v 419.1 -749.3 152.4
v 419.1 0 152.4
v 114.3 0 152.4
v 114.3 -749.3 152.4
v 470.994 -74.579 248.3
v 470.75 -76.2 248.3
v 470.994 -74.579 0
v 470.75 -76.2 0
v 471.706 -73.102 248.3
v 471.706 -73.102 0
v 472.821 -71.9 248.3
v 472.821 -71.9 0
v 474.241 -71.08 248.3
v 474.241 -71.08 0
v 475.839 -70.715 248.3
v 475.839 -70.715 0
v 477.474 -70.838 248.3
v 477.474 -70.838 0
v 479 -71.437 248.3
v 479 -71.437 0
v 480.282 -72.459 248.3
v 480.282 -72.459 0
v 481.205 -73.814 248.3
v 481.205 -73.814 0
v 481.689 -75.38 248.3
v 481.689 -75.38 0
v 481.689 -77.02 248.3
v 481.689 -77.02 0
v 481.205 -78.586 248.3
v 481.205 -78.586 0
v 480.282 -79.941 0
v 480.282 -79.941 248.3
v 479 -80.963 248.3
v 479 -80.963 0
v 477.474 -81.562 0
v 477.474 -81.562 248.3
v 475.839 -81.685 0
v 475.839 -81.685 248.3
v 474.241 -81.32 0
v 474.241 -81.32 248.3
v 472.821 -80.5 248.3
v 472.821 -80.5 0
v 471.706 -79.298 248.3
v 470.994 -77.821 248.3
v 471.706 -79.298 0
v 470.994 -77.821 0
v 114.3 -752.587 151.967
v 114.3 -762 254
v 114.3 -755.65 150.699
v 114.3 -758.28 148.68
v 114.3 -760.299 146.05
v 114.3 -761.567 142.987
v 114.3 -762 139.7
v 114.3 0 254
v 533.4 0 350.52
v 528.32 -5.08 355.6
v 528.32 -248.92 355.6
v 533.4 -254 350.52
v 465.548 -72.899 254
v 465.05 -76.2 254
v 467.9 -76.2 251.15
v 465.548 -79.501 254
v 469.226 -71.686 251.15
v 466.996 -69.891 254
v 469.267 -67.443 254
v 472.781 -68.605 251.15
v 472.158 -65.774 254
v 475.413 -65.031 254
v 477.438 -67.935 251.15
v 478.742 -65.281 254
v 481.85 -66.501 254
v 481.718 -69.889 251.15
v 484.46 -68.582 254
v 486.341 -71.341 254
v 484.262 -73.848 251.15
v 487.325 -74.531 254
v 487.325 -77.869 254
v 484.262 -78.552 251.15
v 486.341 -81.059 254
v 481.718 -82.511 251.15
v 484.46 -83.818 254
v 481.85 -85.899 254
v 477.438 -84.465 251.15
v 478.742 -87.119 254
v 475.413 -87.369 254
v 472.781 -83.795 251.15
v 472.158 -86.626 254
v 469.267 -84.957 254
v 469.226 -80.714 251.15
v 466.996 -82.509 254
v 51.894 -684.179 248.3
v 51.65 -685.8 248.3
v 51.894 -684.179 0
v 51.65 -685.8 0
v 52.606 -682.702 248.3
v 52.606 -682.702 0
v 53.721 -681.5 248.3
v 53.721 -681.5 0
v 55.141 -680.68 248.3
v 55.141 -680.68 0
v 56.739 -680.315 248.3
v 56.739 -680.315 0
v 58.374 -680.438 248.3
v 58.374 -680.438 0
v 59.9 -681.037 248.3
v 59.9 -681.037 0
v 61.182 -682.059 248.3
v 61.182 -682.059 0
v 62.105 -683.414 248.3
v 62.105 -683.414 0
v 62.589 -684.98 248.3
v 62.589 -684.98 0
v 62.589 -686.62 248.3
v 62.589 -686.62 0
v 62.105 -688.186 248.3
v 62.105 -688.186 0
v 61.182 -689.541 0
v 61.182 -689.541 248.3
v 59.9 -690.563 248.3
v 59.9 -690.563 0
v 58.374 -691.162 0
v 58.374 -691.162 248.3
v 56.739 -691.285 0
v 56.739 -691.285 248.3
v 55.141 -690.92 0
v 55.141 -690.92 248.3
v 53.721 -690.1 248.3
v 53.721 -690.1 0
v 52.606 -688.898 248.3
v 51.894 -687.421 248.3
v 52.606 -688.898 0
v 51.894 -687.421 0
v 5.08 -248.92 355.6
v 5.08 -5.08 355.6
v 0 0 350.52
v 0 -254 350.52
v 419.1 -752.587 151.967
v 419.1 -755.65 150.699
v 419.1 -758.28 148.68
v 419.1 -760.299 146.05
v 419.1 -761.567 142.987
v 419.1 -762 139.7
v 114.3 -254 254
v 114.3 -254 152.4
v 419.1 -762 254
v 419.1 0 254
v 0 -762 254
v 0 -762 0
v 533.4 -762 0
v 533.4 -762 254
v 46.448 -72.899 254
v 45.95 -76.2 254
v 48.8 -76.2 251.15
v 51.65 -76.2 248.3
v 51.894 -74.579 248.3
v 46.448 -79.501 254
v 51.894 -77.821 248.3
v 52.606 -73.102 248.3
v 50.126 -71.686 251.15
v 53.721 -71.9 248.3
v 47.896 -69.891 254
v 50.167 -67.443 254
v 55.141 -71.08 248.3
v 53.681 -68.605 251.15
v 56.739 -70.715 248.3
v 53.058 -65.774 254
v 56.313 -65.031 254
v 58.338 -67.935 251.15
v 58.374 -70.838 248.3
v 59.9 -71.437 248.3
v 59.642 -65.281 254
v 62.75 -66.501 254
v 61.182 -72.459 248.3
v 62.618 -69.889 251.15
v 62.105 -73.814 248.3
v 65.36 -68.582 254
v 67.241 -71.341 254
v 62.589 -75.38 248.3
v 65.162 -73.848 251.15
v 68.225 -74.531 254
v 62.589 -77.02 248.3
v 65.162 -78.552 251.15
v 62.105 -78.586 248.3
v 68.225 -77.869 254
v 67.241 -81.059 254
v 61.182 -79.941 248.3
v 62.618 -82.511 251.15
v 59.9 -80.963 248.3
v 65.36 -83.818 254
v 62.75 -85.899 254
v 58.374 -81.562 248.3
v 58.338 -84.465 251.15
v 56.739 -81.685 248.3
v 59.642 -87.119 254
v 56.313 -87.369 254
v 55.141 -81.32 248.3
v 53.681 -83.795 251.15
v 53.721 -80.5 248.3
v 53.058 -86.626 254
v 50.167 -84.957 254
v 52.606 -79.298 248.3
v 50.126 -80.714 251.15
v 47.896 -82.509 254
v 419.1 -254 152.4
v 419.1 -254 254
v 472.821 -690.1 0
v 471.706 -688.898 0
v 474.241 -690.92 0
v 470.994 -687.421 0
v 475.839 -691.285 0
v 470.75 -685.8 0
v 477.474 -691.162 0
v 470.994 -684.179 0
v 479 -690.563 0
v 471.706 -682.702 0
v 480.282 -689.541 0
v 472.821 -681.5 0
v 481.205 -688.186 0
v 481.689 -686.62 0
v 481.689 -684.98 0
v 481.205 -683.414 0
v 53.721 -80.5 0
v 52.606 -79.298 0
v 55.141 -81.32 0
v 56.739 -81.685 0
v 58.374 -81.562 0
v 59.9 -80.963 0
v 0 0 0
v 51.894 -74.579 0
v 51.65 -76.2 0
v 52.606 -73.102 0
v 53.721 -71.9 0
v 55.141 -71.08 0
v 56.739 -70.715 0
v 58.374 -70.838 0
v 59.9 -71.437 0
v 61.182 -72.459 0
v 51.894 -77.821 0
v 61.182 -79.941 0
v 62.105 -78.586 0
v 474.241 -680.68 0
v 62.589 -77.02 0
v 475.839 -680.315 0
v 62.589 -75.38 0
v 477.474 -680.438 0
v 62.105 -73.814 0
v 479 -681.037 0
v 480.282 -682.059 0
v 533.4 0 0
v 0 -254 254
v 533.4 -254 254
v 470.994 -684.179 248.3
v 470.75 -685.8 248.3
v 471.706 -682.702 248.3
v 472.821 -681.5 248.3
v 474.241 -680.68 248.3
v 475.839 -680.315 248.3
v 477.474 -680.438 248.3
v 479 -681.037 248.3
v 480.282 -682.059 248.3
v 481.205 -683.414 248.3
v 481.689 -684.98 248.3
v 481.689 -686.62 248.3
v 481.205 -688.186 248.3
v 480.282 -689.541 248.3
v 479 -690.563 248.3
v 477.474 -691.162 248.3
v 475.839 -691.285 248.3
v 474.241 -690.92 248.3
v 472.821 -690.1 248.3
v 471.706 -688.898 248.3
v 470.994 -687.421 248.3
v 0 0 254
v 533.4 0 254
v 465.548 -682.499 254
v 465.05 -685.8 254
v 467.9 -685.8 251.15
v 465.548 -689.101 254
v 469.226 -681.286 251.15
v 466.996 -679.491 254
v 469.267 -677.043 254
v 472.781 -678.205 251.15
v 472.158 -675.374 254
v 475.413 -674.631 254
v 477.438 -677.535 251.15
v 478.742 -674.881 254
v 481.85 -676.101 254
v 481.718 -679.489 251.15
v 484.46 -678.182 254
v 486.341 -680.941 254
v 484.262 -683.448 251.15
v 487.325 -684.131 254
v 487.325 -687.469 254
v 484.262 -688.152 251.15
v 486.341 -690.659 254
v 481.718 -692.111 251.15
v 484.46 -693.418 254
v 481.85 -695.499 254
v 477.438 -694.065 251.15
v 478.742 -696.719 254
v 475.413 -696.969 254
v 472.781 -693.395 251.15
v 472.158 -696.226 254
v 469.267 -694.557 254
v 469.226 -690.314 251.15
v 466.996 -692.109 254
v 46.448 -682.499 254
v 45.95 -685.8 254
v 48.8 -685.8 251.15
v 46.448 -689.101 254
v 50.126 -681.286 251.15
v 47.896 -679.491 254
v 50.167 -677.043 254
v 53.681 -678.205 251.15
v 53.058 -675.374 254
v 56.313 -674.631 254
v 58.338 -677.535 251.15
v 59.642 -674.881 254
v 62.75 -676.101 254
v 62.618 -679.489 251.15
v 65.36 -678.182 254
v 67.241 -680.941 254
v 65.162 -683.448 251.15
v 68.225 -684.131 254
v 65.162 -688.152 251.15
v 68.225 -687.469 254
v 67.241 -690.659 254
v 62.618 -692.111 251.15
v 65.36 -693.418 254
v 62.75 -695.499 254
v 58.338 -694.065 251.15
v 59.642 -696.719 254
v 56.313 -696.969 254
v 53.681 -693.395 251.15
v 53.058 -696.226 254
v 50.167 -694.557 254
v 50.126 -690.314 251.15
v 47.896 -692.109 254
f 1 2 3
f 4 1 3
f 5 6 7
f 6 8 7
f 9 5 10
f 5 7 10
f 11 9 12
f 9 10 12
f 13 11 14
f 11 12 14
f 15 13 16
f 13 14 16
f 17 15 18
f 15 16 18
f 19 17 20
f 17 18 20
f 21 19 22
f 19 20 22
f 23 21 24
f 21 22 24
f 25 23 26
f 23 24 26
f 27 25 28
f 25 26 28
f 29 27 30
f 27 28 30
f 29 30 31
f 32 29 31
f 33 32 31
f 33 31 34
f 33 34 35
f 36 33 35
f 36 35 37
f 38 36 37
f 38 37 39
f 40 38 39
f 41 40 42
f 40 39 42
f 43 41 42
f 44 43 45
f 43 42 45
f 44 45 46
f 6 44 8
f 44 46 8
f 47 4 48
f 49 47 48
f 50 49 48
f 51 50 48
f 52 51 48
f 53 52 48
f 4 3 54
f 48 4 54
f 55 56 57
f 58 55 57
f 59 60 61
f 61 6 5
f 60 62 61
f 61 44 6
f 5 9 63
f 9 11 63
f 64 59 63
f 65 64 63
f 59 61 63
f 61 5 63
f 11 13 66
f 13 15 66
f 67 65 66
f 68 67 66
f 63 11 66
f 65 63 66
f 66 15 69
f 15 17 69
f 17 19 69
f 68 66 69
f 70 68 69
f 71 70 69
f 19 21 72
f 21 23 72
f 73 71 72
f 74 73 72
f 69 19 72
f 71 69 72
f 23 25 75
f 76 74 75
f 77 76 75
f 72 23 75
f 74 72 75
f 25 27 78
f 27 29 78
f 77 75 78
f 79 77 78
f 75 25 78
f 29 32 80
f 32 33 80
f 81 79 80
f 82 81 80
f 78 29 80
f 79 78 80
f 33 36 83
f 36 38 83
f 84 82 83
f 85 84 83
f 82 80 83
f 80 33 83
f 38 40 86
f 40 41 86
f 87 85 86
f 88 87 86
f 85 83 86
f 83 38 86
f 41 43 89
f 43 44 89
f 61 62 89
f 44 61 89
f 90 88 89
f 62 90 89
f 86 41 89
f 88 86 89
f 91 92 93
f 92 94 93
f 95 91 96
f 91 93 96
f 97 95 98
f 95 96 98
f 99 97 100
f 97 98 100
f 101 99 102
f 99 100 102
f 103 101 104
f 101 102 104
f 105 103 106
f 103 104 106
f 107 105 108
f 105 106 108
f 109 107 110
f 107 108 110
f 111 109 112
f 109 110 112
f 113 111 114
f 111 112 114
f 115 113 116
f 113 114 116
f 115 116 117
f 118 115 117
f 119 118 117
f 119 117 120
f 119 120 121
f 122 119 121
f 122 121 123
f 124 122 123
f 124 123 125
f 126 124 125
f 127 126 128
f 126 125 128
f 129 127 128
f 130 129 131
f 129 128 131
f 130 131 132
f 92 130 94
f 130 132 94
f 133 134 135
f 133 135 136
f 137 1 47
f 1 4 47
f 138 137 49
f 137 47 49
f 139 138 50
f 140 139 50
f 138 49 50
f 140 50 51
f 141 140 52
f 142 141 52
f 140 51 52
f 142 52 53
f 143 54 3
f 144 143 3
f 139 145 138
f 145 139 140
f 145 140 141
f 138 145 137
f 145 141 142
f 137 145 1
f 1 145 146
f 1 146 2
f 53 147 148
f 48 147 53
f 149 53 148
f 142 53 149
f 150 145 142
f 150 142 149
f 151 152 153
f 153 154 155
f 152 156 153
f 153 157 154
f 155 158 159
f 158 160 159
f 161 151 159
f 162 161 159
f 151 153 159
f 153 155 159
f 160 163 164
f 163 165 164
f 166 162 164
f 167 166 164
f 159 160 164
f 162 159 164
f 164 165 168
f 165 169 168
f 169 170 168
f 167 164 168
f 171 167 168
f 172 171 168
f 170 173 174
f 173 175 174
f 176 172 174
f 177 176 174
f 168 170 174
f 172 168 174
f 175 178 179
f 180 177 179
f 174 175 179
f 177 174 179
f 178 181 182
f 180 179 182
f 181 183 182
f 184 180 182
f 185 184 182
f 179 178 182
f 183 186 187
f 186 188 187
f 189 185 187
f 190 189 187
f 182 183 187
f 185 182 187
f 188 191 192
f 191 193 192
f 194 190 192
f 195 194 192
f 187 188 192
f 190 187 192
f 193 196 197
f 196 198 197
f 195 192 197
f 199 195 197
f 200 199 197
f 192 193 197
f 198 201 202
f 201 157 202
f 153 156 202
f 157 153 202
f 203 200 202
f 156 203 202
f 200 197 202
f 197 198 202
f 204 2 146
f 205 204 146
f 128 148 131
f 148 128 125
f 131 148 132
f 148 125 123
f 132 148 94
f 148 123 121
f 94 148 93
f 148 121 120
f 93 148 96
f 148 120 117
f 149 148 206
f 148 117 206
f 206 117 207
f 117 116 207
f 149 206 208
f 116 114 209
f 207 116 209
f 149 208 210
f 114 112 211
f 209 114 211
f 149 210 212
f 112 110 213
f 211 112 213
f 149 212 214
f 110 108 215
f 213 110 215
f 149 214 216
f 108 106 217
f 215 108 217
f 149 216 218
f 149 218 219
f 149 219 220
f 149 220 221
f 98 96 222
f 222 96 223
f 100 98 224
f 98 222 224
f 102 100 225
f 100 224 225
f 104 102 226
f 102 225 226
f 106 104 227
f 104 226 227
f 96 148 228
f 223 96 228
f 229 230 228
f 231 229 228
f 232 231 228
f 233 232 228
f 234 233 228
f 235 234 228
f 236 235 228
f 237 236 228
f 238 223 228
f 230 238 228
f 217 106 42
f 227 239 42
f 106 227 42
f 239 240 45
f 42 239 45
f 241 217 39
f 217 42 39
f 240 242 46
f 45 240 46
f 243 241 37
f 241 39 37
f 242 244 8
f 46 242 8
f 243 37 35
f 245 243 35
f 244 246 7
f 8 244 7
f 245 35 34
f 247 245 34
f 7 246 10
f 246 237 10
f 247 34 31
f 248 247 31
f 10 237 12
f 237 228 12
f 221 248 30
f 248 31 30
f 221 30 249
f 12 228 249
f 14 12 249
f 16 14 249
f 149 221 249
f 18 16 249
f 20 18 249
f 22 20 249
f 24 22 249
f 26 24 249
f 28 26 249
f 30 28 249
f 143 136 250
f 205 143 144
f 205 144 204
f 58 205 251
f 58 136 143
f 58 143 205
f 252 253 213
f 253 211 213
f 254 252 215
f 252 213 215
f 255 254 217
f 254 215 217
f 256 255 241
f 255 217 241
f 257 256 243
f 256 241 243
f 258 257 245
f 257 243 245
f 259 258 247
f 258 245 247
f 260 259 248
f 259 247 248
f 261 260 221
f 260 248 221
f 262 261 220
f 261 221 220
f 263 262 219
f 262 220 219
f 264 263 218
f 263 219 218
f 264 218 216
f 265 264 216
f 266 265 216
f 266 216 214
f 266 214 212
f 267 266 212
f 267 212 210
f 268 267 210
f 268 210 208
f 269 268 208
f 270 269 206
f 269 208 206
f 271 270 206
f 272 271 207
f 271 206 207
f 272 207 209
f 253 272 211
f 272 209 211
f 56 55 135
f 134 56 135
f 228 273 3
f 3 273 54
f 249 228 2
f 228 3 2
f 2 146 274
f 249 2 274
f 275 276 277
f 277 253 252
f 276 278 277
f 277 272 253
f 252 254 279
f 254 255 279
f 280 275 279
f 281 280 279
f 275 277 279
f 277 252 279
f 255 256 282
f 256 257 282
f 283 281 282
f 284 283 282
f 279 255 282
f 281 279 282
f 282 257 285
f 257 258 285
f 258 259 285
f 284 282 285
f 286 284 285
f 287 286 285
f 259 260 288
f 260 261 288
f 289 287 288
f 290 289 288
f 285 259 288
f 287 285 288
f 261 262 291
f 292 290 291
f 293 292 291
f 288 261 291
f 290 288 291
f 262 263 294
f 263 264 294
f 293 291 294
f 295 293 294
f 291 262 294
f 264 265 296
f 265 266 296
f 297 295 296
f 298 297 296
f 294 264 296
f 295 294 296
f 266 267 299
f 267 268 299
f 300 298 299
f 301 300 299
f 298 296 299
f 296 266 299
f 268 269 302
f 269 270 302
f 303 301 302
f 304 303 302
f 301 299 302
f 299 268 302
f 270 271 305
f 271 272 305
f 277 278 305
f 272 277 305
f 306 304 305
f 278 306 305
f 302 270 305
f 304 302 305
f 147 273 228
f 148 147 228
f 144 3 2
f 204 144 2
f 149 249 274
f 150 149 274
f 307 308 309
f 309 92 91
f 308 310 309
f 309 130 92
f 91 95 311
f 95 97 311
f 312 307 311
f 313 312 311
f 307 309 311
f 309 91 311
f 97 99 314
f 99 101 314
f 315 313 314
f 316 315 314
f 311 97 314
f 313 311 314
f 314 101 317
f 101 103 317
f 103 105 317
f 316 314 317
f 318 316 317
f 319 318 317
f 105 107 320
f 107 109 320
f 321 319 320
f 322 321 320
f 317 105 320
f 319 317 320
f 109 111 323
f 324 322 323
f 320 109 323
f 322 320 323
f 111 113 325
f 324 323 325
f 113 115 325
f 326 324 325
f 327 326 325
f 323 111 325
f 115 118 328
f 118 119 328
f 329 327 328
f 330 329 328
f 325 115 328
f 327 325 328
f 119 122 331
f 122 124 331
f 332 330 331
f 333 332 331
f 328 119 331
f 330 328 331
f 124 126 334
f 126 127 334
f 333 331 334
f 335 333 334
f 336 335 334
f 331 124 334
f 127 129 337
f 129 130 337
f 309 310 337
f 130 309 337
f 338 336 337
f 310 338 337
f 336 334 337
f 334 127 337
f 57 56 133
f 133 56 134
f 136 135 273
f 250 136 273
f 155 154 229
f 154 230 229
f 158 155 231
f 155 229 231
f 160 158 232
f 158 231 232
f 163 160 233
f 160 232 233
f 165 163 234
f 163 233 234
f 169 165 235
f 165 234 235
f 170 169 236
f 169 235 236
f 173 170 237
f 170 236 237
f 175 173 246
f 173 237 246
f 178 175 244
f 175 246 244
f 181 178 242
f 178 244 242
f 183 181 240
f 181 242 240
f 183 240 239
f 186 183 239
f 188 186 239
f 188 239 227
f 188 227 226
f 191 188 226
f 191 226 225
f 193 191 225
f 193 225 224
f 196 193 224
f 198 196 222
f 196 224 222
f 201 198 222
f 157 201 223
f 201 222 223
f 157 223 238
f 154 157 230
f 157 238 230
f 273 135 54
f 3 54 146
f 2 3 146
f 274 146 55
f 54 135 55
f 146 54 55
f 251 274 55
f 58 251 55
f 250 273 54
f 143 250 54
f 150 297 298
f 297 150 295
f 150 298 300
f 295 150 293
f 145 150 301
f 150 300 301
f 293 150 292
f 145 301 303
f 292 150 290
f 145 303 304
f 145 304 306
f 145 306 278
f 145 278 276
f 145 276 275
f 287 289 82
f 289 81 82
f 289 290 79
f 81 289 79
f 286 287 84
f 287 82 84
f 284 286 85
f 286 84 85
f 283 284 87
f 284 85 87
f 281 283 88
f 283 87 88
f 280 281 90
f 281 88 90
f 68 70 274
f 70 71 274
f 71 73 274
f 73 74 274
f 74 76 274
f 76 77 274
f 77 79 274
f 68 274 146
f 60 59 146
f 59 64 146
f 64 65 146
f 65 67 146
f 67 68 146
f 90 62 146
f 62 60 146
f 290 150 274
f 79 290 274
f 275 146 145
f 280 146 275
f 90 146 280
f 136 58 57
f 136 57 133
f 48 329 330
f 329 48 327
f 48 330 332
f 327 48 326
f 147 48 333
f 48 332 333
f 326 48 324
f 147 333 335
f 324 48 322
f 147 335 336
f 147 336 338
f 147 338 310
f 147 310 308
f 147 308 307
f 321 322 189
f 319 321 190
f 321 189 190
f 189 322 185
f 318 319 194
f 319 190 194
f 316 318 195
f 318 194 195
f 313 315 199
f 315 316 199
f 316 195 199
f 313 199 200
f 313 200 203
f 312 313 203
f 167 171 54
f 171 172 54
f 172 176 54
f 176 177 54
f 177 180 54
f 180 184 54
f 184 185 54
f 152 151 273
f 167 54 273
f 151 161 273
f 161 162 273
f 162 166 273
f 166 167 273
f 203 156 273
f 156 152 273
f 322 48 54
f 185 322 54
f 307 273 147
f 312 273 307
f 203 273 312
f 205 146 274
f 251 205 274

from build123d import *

# Parameters (mm, degrees)
F1_DEPTH       = 762
F3_D           = 11
F3_CSINK_D     = 22.4
F3_CSINK_ANGLE = 90
F5_DEPTH       = 254
F6_R           = 12.7
F7_SIZE        = 5.08


with BuildPart() as f1:
    # F0 (on Front) → F1 (new body)
    with BuildSketch(Plane.XZ):
        Polygon((114.3, 254), (0, 254), (0, 0), (533.4, 0), (533.4, 254), (419.1, 254), (419.1, 152.4), (114.3, 152.4), align=None)
    extrude(amount=F1_DEPTH)

    # F3 (through all)
    with Locations(Plane.XY.offset(254)):
        with Locations((57.15, -76.2), (476.25, -76.2), (476.25, -685.8), (57.15, -685.8)):
            CounterSinkHole(F3_D / 2, F3_CSINK_D / 2, counter_sink_angle=F3_CSINK_ANGLE)

    # F6
    f6_edges = [f1.edges().sort_by_distance(p)[0] for p in [
        (266.7, -762, 152.4),
    ]]
    fillet(f6_edges, radius=F6_R)


with BuildPart() as f5:
    # F4 (on Front) → F5 (new body)
    with BuildSketch(Plane.XZ):
        Polygon((0, 355.6), (0, 254), (114.3, 254), (114.3, 152.4), (419.1, 152.4), (419.1, 254), (533.4, 254), (533.4, 355.6), align=None)
    extrude(amount=F5_DEPTH)

    # F7
    f7_edges = [f5.edges().sort_by_distance(p)[0] for p in [
        (533.4, -127, 355.6),
        (0, -127, 355.6),
        (266.7, 0, 355.6),
        (266.7, -254, 355.6),
    ]]
    chamfer(f7_edges, length=F7_SIZE)


solid = Compound([f1.part, f5.part])
